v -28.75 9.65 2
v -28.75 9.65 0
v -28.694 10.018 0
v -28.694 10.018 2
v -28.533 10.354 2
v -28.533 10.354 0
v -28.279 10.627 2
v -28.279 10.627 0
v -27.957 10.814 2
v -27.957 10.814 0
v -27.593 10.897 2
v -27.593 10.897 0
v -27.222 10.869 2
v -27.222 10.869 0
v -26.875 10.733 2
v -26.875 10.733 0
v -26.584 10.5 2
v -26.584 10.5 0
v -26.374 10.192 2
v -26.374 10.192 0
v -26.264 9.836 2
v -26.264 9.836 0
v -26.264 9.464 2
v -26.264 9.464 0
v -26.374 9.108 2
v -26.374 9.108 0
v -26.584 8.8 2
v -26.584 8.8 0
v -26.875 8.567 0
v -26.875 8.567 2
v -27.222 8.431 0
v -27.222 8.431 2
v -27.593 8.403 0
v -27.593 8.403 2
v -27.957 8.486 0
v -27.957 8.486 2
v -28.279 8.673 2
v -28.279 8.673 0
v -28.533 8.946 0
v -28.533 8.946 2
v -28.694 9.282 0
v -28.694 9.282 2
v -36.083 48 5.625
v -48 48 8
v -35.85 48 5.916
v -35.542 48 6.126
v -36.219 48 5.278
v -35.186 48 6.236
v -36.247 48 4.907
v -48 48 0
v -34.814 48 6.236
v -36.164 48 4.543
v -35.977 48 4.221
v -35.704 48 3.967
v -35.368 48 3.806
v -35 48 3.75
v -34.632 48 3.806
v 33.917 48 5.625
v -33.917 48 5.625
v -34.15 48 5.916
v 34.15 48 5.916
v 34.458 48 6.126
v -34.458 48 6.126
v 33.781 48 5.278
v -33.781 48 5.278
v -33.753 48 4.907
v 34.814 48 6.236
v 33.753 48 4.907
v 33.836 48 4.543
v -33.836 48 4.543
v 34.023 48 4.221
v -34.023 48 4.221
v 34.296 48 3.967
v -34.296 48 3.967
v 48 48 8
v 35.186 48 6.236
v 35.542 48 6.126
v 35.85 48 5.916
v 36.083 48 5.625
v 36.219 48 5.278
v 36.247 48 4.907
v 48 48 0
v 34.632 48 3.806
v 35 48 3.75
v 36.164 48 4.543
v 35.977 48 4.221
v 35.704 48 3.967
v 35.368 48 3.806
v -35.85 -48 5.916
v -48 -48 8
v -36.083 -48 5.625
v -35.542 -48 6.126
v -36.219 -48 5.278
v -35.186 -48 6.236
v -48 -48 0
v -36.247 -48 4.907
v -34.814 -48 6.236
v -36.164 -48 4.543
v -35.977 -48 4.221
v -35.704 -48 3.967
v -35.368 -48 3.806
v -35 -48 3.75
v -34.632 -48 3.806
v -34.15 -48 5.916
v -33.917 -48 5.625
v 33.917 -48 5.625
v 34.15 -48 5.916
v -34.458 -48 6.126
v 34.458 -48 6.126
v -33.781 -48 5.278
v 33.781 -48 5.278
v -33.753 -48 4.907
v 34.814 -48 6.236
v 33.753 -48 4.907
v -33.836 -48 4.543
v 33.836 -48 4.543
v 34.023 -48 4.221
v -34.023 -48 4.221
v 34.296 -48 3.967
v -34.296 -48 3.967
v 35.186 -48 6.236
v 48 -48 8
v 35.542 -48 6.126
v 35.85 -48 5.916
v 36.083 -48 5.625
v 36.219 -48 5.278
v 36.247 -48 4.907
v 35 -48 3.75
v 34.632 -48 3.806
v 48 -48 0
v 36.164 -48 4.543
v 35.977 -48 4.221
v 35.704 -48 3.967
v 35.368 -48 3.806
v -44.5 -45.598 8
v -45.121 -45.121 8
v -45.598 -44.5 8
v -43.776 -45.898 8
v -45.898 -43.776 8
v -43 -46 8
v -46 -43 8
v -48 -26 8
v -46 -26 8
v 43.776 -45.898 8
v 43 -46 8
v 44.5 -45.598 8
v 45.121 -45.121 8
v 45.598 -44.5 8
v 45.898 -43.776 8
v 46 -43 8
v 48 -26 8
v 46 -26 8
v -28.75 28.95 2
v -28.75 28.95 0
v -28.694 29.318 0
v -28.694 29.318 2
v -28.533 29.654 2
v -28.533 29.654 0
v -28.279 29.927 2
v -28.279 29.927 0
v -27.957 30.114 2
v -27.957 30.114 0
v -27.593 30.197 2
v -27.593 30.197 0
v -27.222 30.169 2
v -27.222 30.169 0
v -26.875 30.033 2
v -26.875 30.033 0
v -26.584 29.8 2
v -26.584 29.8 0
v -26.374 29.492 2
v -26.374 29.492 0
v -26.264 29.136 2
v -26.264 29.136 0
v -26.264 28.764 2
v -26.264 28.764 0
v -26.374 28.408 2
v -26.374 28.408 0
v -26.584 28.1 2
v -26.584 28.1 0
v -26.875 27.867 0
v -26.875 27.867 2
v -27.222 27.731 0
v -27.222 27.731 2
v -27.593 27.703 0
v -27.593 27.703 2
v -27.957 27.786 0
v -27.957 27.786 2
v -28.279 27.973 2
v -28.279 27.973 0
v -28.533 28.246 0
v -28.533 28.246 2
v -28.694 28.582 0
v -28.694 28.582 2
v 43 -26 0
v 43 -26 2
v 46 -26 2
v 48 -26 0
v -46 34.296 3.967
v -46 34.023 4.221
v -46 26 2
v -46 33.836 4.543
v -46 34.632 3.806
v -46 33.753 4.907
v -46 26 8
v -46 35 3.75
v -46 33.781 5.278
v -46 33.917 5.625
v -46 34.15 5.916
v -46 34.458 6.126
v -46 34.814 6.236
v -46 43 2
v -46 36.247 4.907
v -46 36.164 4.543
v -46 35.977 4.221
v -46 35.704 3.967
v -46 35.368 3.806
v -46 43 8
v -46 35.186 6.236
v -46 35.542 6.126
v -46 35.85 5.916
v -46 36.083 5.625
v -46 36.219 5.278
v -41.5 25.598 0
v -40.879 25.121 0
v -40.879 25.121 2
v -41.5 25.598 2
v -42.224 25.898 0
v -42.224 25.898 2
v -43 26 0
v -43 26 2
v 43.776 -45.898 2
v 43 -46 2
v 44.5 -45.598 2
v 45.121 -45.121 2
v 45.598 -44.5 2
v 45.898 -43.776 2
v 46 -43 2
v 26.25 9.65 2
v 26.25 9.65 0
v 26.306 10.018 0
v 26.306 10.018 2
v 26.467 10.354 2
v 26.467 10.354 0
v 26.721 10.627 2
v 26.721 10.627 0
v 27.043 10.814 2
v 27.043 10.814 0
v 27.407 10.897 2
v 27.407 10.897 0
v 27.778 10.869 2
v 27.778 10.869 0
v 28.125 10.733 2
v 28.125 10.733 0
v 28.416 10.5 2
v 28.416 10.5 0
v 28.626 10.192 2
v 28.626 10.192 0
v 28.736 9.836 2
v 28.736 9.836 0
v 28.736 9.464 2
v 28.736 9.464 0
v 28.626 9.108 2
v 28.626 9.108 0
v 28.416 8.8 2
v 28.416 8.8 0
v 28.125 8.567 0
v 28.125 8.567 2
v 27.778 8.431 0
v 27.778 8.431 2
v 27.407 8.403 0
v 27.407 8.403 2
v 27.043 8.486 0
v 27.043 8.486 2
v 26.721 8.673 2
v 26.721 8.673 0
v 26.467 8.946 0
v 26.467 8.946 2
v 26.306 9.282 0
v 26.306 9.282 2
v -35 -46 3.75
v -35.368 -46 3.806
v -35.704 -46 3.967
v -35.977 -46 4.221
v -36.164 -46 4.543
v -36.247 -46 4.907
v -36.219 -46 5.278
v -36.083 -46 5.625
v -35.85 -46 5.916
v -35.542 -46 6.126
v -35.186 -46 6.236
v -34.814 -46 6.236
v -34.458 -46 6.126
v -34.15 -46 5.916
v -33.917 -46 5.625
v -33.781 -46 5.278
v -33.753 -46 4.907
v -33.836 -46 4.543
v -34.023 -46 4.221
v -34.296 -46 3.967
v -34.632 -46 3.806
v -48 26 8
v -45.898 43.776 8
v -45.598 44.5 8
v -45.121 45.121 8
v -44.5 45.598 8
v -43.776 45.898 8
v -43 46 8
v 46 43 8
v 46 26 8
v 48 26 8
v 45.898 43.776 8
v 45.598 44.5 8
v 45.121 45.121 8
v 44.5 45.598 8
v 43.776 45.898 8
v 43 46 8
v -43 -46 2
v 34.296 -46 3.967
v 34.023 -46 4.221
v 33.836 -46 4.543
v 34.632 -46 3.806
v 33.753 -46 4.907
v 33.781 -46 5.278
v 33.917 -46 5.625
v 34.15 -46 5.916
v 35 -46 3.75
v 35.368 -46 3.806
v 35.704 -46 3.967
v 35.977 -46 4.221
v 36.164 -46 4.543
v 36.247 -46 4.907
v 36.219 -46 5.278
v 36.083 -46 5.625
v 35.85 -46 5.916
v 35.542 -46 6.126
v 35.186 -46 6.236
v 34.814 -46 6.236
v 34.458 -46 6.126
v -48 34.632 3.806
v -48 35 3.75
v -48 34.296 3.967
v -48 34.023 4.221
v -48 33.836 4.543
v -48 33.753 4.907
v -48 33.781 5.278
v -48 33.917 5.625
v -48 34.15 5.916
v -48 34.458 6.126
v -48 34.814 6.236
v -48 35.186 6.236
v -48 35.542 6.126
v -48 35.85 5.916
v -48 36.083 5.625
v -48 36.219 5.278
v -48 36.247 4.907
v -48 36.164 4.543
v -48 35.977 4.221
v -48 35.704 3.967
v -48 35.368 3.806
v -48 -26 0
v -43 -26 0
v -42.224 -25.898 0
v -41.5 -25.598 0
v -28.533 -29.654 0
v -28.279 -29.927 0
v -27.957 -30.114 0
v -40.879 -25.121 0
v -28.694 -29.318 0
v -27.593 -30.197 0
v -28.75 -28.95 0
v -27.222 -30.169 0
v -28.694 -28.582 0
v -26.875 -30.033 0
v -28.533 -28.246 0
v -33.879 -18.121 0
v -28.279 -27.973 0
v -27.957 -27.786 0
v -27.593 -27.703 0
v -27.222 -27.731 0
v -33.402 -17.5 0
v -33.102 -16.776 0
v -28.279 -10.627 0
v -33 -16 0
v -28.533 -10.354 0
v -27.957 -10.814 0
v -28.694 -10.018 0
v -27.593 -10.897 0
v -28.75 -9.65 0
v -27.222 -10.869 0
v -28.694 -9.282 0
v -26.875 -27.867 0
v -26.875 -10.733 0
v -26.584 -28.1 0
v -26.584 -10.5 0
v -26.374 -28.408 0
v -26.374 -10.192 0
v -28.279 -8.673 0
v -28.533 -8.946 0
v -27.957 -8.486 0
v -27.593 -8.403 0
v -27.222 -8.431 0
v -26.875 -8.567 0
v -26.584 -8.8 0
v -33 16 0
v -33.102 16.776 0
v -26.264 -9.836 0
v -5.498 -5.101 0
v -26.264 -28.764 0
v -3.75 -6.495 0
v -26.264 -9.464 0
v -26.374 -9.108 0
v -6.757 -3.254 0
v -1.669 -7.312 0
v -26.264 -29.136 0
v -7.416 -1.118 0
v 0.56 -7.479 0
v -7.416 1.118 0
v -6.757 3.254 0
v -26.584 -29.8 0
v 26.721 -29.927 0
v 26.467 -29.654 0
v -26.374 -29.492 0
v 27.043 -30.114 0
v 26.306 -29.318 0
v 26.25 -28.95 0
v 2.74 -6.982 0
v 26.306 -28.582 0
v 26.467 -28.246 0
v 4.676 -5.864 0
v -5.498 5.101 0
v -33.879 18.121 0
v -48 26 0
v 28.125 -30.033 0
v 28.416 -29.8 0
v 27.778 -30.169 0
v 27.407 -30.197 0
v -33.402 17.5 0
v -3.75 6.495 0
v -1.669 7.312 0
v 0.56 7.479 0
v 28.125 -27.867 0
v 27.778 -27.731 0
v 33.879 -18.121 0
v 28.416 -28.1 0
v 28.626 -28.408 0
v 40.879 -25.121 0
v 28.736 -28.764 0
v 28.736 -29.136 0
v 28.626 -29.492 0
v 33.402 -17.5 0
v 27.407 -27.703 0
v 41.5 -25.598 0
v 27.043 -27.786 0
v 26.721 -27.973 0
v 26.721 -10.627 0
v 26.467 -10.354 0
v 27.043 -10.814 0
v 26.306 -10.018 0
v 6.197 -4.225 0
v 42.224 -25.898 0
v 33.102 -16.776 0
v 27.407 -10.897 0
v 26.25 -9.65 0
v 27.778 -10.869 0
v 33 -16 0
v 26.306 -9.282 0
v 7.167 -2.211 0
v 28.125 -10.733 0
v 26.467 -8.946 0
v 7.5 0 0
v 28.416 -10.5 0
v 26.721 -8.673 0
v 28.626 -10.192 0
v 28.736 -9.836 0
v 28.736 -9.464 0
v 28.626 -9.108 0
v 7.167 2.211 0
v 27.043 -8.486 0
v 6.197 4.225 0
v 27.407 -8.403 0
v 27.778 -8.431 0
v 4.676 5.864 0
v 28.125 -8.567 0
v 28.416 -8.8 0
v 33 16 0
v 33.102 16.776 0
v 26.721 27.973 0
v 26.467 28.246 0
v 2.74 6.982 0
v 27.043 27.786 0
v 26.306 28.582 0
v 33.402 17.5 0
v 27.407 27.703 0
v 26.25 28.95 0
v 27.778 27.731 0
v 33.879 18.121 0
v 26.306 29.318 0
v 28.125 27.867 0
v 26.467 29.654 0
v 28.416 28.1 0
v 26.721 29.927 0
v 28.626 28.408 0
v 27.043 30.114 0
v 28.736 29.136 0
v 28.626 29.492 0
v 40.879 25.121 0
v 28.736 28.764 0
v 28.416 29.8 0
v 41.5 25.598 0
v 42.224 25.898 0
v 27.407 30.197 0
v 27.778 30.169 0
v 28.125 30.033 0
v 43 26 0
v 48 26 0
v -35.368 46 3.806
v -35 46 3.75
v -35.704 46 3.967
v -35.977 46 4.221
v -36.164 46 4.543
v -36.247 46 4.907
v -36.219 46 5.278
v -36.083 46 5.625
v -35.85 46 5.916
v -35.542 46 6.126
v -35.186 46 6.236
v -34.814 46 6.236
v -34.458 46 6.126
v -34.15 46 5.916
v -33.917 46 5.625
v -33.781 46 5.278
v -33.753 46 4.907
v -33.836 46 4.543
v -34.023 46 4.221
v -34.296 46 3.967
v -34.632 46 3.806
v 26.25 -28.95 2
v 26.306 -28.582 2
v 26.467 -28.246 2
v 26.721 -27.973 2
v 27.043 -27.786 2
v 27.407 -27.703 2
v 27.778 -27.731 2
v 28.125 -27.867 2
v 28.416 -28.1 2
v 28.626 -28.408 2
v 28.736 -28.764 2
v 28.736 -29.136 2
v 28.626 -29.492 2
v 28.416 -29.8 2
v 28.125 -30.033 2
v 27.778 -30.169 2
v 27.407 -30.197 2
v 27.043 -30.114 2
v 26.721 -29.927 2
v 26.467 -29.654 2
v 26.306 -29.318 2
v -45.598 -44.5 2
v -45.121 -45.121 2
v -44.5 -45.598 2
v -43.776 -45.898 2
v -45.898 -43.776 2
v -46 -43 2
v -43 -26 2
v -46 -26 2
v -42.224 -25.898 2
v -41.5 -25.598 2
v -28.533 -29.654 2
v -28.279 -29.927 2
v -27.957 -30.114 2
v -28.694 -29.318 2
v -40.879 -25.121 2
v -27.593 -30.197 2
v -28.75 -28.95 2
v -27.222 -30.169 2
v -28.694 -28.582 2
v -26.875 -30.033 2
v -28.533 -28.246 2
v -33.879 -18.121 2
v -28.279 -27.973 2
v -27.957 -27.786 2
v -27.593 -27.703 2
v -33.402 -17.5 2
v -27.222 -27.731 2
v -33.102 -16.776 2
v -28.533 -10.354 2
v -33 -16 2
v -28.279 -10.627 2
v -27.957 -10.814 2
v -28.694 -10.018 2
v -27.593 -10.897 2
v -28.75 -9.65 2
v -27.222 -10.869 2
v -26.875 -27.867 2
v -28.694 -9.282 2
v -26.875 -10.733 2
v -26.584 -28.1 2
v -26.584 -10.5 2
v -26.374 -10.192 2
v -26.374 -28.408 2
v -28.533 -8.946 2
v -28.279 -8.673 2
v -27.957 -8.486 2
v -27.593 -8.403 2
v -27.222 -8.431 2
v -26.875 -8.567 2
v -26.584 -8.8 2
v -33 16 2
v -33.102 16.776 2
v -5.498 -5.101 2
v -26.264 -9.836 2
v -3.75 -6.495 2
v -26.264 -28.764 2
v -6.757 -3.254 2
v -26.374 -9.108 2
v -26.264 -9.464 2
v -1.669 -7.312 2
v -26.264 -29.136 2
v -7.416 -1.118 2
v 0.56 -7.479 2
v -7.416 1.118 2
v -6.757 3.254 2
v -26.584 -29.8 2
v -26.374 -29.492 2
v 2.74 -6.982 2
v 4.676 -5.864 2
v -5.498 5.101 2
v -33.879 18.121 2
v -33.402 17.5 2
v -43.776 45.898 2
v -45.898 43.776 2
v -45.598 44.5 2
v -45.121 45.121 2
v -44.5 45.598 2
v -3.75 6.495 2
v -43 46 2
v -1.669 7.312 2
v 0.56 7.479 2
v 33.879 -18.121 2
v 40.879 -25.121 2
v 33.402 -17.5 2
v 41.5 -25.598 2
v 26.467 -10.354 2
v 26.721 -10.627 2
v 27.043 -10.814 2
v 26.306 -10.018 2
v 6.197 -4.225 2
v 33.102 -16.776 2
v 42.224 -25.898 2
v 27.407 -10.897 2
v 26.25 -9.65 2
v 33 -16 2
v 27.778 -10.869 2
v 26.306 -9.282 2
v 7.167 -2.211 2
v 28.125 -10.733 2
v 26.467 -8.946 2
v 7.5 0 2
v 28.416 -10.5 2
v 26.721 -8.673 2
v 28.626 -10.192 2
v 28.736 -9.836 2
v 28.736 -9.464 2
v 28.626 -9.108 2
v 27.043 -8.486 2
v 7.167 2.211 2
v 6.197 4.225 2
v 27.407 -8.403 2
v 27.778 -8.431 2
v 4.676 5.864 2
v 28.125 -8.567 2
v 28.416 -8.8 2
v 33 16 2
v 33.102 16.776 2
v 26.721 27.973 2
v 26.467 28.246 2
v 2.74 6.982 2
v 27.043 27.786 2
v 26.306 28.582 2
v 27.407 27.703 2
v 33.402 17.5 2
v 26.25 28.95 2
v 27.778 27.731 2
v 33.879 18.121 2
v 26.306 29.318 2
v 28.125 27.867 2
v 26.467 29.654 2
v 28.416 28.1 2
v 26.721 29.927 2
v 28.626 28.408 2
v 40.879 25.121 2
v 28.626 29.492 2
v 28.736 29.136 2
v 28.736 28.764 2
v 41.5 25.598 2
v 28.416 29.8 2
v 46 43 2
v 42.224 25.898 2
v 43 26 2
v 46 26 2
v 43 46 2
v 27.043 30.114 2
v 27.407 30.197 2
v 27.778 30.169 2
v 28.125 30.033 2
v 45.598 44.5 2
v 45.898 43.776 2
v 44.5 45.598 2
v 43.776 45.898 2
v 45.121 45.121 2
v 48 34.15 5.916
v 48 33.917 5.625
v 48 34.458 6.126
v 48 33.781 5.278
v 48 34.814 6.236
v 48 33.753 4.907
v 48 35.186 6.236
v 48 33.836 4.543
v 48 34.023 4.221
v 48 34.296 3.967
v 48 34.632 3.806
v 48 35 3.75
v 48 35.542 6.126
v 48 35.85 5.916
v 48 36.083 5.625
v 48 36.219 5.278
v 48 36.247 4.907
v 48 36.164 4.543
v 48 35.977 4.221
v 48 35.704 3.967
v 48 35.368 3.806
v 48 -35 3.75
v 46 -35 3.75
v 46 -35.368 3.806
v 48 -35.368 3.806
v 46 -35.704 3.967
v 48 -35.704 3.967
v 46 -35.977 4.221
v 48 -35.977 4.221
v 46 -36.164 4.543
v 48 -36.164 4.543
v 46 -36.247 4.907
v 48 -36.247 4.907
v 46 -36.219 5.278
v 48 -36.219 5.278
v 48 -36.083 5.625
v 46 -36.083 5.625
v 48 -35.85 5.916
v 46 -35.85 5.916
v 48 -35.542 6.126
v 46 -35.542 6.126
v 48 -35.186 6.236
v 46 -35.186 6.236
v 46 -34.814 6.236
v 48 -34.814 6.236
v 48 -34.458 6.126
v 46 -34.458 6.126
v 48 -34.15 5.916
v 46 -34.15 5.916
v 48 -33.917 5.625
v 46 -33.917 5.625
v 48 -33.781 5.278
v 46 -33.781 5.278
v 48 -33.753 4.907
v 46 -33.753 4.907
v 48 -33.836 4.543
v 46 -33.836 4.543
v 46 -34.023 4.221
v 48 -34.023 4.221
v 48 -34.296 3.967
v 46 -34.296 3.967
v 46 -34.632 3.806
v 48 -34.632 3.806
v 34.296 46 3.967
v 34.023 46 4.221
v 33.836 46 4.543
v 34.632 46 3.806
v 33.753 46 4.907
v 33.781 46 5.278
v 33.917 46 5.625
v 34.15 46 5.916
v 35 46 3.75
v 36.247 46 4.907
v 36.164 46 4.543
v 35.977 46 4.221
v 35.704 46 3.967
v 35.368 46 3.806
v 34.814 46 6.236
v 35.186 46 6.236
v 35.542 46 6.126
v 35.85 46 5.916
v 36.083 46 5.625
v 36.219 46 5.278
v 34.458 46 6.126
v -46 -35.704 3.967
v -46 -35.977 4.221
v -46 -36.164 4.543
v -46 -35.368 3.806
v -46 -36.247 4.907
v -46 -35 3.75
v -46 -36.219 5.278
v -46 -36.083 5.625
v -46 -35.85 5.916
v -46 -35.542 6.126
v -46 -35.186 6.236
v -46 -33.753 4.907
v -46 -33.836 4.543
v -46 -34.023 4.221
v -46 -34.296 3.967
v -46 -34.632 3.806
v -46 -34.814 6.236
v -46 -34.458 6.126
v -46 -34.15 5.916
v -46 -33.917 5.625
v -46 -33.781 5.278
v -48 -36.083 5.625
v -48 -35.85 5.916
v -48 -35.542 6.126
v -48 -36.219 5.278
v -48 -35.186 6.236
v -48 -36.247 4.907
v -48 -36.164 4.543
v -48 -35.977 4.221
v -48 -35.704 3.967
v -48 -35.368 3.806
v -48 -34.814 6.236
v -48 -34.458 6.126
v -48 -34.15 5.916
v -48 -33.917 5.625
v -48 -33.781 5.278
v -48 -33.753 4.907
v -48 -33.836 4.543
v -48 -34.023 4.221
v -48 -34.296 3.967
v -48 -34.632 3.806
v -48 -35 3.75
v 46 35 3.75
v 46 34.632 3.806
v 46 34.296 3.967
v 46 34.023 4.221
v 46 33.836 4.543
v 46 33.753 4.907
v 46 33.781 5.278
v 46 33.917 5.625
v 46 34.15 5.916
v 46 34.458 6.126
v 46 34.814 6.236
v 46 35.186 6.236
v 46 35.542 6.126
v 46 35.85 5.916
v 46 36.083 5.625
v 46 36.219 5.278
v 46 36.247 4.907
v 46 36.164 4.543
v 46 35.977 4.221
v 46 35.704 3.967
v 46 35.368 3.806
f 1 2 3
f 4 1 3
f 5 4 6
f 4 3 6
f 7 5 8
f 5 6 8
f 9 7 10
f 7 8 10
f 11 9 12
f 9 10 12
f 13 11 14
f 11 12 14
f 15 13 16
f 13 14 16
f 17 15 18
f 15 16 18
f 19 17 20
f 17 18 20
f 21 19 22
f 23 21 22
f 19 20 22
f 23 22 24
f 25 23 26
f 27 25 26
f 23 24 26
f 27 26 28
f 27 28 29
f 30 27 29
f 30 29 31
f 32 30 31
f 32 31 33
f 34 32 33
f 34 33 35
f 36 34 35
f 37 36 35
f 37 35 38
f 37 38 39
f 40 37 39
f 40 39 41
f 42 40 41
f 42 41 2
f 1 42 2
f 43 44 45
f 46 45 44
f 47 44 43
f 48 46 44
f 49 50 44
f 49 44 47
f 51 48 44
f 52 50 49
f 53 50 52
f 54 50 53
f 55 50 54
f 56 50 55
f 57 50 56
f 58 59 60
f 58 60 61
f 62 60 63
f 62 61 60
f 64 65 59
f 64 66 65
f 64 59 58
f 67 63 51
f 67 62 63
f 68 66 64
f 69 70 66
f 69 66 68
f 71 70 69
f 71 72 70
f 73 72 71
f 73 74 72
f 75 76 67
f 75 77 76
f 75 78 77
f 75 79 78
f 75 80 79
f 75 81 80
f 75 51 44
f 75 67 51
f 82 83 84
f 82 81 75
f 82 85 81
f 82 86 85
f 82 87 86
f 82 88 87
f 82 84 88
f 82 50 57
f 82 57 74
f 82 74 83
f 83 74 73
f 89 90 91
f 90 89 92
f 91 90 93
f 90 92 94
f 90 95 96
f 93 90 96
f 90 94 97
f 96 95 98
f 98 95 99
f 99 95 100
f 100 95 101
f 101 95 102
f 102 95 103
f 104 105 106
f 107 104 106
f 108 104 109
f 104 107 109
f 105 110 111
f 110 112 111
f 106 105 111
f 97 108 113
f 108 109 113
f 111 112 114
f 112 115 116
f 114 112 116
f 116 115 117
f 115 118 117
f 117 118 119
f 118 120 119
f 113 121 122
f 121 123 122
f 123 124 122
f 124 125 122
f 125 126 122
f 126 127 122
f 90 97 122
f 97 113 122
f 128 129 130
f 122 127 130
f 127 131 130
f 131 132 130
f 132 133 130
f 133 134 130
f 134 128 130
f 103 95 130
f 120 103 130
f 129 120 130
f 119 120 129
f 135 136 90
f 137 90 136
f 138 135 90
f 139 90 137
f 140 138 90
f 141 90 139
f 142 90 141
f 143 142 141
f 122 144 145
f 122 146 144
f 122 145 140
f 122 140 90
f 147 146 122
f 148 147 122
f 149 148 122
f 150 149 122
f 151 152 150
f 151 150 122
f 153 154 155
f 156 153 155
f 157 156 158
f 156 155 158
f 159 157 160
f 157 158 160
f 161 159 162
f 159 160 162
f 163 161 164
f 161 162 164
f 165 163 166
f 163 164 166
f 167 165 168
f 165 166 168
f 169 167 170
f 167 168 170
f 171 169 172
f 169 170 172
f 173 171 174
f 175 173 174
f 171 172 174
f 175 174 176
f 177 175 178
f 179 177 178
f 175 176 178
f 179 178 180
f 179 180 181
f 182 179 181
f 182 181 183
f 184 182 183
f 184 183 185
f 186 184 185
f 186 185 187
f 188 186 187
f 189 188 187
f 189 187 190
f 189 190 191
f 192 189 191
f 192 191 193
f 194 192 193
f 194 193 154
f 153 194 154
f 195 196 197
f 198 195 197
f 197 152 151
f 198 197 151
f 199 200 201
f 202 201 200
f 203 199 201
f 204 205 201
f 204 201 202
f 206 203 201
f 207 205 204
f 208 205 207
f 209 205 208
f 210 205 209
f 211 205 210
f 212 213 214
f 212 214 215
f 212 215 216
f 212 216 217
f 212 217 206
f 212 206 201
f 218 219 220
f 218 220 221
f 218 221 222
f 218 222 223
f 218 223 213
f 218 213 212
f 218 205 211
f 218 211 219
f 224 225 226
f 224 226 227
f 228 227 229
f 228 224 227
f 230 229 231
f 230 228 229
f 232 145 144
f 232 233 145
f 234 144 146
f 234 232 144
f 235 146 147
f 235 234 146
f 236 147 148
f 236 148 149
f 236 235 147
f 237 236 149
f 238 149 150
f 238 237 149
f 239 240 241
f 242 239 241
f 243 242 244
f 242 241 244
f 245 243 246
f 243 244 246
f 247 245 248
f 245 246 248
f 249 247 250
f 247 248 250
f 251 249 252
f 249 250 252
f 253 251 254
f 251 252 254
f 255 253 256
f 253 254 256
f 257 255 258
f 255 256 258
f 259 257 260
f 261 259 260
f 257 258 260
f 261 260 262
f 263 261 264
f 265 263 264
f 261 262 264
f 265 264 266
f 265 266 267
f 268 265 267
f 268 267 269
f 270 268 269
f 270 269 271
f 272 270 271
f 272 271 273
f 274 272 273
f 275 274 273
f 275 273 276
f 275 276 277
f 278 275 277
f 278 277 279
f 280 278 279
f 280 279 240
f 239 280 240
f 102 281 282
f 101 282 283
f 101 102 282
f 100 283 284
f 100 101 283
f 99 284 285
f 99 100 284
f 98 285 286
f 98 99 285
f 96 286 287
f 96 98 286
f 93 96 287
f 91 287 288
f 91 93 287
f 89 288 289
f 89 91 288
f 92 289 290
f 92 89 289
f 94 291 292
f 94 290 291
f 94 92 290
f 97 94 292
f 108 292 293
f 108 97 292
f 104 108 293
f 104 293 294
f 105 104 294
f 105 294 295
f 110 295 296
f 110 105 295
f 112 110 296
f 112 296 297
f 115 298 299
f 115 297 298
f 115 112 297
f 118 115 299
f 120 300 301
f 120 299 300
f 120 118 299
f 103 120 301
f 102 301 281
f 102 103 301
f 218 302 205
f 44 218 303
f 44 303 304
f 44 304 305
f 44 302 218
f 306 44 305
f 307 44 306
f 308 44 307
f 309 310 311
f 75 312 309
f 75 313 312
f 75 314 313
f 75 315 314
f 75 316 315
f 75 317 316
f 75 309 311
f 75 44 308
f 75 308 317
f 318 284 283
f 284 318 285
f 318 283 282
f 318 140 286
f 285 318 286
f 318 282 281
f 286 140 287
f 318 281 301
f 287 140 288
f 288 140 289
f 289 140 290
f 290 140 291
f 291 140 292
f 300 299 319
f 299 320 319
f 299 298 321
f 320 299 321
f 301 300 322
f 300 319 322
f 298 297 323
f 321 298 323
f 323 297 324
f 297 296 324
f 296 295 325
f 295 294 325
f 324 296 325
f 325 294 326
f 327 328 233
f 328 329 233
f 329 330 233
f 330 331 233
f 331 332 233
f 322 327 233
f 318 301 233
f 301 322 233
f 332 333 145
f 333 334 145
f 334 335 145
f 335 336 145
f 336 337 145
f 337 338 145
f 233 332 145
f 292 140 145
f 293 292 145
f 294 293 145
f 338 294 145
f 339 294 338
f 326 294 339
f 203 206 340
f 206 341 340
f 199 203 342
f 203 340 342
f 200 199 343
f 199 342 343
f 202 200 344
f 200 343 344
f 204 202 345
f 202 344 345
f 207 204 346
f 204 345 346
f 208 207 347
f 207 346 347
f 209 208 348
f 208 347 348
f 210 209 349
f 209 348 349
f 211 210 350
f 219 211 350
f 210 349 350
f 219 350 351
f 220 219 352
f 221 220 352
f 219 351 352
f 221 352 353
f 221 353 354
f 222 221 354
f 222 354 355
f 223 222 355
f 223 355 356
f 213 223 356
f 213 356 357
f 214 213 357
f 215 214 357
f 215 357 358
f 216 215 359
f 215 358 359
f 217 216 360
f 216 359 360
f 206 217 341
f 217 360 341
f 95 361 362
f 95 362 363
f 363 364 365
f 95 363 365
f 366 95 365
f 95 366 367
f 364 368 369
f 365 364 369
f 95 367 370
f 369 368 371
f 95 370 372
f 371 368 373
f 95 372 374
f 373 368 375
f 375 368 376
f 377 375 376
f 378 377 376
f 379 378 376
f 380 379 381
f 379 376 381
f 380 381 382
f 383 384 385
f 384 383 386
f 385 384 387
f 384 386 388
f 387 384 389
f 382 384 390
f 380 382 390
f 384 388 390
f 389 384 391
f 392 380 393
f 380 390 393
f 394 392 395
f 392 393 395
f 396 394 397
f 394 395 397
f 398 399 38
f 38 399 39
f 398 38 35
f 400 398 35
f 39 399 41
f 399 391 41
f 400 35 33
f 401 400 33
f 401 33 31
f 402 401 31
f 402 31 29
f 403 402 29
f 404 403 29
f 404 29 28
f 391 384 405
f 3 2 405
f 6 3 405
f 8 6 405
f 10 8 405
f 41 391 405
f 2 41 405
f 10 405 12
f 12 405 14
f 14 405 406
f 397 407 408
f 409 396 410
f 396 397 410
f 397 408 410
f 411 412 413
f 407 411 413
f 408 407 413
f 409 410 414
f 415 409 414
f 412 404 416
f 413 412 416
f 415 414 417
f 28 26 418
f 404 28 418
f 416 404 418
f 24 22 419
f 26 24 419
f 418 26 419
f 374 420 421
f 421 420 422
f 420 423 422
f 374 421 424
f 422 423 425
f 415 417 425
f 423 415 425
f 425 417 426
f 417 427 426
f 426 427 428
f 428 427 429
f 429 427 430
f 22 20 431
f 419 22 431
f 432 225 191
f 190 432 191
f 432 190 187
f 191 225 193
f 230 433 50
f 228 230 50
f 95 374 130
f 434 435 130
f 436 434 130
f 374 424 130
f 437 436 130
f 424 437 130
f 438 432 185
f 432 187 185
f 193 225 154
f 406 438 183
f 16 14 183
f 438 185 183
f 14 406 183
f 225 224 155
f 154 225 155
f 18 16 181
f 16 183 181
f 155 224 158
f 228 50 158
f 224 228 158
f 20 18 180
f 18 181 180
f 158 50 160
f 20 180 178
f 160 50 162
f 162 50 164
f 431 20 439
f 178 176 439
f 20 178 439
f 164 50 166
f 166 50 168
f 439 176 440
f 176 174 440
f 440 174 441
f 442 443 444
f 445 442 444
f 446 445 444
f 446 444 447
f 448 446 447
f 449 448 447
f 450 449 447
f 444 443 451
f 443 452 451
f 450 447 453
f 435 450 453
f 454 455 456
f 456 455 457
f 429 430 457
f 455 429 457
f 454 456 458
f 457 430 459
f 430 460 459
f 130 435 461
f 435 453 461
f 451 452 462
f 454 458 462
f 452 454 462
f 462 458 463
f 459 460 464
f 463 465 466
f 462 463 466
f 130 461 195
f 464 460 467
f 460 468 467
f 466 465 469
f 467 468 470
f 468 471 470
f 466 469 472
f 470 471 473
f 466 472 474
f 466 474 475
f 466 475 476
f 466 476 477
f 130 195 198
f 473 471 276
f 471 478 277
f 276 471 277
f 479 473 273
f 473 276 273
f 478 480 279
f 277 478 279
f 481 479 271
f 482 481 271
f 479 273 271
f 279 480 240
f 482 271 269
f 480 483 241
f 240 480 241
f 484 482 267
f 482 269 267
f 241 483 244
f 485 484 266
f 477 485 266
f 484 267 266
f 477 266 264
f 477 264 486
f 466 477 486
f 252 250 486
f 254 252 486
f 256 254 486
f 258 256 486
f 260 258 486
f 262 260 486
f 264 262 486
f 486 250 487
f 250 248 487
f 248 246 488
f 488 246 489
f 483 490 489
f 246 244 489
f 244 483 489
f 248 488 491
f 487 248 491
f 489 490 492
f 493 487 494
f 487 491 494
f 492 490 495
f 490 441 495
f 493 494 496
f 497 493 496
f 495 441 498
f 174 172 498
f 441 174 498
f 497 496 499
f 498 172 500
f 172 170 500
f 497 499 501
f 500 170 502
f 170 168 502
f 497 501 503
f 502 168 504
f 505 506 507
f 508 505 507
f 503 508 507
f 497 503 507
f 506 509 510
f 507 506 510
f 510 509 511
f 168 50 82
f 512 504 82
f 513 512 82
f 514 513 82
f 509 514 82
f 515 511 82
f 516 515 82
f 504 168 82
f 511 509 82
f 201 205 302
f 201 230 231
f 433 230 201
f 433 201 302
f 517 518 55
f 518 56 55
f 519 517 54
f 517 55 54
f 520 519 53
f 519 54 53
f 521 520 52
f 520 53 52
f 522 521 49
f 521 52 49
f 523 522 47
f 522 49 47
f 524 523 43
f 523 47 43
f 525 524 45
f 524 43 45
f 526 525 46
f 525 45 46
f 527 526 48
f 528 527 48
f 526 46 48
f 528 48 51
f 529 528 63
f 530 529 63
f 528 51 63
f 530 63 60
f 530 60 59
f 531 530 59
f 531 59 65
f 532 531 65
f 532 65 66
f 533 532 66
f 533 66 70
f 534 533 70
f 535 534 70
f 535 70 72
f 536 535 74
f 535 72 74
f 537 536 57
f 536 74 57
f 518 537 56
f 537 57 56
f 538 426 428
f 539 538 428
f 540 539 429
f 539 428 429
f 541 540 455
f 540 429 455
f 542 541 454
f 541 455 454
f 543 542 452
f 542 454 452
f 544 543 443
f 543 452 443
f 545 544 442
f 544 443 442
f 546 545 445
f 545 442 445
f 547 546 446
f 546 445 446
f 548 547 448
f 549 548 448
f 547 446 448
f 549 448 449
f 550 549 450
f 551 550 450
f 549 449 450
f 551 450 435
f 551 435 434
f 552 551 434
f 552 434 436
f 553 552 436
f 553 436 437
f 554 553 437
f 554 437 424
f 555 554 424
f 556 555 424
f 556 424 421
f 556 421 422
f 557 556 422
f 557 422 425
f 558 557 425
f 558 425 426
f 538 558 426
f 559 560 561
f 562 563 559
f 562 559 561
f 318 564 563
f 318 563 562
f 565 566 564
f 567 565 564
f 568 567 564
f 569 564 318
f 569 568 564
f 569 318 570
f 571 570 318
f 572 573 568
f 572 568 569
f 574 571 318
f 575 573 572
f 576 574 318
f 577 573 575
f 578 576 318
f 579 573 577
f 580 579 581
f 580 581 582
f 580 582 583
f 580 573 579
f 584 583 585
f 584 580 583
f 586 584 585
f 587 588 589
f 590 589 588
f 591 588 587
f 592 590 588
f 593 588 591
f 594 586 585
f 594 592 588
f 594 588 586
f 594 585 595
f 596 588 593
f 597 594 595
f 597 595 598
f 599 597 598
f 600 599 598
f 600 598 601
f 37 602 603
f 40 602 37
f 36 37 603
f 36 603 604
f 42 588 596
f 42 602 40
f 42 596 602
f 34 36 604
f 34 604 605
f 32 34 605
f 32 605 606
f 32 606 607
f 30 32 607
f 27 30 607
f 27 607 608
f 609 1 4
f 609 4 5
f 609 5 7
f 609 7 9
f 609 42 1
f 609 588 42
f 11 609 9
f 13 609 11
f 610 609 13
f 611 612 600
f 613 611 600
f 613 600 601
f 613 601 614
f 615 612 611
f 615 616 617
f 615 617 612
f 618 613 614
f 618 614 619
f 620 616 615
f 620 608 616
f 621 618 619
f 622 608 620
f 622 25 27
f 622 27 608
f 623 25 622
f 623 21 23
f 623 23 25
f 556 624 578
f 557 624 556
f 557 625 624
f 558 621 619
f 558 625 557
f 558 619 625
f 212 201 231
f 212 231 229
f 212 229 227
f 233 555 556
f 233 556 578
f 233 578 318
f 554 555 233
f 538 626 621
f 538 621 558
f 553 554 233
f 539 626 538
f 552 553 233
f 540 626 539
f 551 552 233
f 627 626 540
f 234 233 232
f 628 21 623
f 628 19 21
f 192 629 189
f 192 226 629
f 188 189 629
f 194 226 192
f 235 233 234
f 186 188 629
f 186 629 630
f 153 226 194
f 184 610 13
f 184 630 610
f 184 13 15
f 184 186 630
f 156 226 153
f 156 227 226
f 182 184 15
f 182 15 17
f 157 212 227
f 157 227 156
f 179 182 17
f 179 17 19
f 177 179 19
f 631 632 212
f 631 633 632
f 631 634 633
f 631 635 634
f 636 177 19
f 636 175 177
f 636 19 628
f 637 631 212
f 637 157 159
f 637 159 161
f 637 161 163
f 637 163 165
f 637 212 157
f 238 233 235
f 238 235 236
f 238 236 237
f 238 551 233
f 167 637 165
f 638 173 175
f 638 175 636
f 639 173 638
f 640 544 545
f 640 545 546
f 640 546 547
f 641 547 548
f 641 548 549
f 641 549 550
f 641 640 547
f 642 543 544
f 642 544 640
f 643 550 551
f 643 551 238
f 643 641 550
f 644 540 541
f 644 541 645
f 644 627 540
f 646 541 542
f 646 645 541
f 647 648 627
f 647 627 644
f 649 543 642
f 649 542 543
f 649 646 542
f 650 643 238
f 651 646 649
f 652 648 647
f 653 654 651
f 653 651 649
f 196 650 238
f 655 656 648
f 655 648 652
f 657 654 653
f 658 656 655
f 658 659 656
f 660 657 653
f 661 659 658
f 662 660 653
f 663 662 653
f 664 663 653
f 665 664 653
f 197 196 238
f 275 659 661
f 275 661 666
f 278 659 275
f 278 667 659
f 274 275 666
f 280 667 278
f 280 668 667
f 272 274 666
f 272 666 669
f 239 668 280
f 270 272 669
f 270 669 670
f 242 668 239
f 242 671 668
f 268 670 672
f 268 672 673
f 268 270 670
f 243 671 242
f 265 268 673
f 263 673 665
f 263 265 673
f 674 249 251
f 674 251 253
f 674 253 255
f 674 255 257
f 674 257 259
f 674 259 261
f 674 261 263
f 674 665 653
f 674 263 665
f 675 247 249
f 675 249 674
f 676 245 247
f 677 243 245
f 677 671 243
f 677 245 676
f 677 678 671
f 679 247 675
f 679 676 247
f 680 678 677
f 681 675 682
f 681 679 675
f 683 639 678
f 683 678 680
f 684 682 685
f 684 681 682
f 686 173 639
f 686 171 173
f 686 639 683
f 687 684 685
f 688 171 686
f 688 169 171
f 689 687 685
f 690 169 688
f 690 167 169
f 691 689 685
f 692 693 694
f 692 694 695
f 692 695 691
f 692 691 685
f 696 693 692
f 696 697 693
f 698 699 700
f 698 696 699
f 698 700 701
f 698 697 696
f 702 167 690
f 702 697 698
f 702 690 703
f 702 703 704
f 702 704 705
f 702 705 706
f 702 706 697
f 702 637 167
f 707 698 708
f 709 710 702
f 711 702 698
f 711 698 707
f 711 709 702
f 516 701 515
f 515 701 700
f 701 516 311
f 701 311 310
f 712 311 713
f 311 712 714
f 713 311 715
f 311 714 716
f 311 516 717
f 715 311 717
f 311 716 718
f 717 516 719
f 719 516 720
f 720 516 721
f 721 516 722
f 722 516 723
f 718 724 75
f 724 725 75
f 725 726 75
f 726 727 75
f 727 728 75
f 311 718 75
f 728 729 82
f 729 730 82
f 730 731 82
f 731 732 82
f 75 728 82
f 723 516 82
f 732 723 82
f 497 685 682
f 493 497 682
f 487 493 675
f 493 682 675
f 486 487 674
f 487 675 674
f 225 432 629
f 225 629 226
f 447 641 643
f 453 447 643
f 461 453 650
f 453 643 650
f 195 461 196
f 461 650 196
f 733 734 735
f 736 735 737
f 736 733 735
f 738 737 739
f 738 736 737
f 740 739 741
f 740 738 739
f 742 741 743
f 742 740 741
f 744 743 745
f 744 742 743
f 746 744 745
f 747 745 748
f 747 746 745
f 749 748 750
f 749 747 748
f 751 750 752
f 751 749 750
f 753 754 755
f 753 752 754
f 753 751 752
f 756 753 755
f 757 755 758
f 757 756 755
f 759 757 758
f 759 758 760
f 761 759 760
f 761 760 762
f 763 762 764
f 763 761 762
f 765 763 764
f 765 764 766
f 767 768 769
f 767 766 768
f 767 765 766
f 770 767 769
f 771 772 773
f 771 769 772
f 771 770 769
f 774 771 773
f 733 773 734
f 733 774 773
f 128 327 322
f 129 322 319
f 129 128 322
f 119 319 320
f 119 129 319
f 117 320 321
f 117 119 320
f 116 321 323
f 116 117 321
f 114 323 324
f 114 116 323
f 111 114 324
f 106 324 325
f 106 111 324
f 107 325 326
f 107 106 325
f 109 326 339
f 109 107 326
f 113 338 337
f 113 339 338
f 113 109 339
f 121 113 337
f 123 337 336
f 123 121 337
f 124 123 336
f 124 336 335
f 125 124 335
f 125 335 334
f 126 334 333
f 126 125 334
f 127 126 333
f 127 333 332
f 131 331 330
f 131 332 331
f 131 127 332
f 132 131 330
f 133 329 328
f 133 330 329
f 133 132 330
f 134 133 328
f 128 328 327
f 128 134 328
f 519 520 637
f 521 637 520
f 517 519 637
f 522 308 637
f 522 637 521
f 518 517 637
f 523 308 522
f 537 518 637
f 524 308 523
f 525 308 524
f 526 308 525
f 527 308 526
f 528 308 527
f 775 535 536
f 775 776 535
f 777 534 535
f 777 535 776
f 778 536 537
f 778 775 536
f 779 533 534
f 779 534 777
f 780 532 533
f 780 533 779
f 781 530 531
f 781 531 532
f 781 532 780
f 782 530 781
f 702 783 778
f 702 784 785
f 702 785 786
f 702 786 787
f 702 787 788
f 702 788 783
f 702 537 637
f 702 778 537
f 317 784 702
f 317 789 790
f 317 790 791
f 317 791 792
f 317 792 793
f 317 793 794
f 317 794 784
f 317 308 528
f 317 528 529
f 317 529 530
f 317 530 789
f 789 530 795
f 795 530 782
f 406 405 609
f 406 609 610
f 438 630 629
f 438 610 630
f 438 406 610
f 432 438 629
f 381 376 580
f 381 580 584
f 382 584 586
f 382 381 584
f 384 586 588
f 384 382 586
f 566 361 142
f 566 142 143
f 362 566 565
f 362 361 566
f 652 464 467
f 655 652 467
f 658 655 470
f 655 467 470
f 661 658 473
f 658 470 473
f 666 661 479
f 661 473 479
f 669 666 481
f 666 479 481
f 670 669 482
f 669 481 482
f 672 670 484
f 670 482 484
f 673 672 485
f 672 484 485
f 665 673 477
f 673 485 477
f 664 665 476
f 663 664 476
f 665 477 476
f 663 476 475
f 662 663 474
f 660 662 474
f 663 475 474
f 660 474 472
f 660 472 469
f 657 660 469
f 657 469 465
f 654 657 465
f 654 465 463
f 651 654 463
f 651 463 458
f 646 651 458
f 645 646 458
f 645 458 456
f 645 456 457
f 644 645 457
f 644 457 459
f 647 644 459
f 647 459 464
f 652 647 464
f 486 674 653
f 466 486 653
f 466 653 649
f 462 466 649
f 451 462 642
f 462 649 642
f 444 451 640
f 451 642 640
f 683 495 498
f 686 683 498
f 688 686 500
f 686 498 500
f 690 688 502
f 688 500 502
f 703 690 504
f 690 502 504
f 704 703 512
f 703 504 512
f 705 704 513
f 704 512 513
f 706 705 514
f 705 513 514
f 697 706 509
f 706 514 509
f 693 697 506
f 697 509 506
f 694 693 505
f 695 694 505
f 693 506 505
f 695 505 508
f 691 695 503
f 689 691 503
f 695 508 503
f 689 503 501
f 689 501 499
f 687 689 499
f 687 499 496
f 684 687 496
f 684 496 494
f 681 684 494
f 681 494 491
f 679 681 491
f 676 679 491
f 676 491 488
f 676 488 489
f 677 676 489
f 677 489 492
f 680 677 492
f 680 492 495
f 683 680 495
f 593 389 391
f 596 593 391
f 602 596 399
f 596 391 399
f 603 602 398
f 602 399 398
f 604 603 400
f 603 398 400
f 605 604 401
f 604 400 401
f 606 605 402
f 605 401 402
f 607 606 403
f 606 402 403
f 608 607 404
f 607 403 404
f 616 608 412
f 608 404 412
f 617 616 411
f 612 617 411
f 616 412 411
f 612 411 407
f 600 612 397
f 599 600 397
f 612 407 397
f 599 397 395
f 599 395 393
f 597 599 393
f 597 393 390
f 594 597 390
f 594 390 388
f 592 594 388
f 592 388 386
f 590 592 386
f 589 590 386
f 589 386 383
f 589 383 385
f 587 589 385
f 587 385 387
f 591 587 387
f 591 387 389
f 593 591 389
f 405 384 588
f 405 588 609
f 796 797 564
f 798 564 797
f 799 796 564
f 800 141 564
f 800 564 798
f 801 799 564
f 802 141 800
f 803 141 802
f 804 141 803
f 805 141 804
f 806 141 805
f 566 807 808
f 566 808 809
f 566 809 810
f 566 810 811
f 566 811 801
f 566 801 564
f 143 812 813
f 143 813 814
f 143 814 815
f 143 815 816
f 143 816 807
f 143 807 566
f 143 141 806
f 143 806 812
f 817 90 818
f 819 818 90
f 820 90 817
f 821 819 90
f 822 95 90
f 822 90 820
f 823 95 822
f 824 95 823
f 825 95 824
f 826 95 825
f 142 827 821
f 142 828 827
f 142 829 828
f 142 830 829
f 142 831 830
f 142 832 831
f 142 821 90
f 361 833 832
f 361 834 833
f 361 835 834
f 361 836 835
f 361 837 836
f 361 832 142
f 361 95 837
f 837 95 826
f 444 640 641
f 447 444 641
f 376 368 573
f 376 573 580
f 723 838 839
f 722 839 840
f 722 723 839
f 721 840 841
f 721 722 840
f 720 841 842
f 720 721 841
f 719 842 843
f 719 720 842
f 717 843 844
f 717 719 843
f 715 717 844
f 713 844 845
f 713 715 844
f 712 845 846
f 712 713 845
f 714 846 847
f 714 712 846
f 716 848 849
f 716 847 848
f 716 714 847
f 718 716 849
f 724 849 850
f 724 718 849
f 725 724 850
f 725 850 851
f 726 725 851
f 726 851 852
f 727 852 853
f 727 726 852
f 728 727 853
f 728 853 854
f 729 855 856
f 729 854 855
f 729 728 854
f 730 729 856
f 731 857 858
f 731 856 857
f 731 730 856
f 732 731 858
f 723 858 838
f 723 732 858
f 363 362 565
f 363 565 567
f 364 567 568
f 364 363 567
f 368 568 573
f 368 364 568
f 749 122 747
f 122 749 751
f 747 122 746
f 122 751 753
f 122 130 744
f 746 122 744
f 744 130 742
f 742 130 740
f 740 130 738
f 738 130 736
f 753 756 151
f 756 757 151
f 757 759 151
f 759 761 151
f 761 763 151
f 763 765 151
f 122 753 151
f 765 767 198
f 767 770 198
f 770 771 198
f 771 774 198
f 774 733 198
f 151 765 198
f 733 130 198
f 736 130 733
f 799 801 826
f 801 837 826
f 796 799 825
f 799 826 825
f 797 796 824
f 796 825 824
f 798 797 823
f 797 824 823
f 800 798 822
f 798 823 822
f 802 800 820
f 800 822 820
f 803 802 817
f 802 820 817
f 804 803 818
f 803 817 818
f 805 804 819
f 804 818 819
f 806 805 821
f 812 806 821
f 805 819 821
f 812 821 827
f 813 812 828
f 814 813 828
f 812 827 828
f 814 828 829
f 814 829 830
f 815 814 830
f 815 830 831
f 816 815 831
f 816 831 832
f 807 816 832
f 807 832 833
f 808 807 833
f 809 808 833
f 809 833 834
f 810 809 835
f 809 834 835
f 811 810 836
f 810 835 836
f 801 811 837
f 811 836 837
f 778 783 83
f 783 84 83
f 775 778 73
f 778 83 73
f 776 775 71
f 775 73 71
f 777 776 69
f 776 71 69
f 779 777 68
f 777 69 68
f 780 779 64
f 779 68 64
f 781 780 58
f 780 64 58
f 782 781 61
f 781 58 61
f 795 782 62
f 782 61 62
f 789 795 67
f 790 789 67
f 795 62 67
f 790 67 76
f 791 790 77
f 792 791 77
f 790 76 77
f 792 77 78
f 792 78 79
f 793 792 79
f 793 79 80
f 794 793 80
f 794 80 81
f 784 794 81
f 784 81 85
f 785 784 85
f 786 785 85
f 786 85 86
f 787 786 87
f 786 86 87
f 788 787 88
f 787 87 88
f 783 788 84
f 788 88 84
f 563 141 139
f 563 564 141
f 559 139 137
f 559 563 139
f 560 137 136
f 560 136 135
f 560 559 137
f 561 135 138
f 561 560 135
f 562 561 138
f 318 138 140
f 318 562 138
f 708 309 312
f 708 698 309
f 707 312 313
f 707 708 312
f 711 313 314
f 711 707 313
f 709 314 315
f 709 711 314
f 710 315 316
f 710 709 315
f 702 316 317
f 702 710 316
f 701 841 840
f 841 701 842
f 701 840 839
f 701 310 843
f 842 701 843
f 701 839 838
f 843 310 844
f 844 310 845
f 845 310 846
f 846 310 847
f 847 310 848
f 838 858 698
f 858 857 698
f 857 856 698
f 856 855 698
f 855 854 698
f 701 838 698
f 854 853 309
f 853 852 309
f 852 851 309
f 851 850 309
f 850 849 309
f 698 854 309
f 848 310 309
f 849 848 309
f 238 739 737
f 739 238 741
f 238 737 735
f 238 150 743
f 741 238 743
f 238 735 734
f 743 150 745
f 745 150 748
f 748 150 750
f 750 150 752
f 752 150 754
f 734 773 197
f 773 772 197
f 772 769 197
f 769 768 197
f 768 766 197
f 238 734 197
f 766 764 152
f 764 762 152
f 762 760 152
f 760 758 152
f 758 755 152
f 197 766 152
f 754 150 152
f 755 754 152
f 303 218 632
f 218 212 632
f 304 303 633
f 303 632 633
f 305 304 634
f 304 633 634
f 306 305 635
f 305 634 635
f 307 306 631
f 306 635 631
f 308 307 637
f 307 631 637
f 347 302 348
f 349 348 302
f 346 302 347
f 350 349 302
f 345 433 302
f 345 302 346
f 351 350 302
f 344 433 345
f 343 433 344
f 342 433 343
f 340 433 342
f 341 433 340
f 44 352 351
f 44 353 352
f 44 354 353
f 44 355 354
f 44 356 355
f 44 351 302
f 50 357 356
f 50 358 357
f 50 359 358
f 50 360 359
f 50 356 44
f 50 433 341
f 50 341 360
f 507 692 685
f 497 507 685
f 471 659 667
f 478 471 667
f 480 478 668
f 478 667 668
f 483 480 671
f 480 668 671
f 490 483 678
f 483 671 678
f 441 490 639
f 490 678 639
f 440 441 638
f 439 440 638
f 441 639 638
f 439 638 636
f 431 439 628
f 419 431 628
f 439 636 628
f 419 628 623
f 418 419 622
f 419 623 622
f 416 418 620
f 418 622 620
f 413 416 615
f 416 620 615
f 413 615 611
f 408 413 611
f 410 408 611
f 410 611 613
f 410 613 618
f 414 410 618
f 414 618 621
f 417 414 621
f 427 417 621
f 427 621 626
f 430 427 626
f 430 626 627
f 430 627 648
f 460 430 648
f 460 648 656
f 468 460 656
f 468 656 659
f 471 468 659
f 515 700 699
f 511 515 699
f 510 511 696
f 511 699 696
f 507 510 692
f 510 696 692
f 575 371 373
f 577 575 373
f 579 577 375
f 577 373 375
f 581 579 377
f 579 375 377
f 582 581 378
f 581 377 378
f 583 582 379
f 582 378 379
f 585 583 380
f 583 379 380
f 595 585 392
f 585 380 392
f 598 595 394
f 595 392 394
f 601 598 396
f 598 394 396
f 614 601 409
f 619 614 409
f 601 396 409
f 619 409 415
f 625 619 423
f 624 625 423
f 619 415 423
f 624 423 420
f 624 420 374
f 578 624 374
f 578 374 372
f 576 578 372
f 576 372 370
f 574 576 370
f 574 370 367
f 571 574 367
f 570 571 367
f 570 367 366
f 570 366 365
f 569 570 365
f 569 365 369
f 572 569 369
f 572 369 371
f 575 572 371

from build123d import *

# Parameters (mm, degrees)
SKETCH1_W                      = 96
SKETCH1_H                      = 96
BOSS_EXTRUDE1_DEPTH            = 8
SKETCH2_W                      = 92
SKETCH2_H                      = 92
COMPONENT_PLATFORM_DEPTH       = 6
CABLE_SLOTS_DEPTH              = 6
SKETCH4_R                      = 7.5
CENTER_MASS_CUT_DEPTH          = 6
INNER_CORNER_FILLETS_R         = 3
M3X0_5_TAPPED_HOLE1_AT_2_COUNT = 2
M3X0_5_TAPPED_HOLE1_AT_2_PITCH = 70
M3X0_5_TAPPED_HOLE2_AT_2_COUNT = 2
M3X0_5_TAPPED_HOLE2_AT_2_PITCH = 70
M3X0_5_TAPPED_HOLE3_D          = 2.5


with BuildPart() as part:
    # Sketch1 → Boss-Extrude1 (new body)
    with BuildSketch(Plane.XY):
        Rectangle(SKETCH1_W, SKETCH1_H)
    extrude(amount=BOSS_EXTRUDE1_DEPTH)

    # Sketch2 → Component Platform (cut)
    with BuildSketch(Plane.XY.offset(8)):
        Rectangle(SKETCH2_W, SKETCH2_H)
    extrude(amount=-COMPONENT_PLATFORM_DEPTH, mode=Mode.SUBTRACT)

    # Sketch3 → Cable Slots (cut, symmetric)
    with BuildSketch(Plane.XY.offset(2)):
        with BuildLine():
            Line((-40.878679656, -25.121320344), (-33.878679656, -18.121320344))
            ThreePointArc((-33.878679656, -18.121320344), (-33.228361402, -17.148050297), (-33, -16))
            Line((-33, -16), (-33, 16))
            ThreePointArc((-33, 16), (-33.228361402, 17.148050297), (-33.878679656, 18.121320344))
            Line((-33.878679656, 18.121320344), (-40.878679656, 25.121320344))
            ThreePointArc((-40.878679656, 25.121320344), (-41.851949703, 25.771638598), (-43, 26))
            Line((-43, 26), (-48, 26))
            Line((-48, 26), (-48, -26))
            Line((-48, -26), (-43, -26))
            ThreePointArc((-43, -26), (-41.851949703, -25.771638598), (-40.878679656, -25.121320344))
        make_face()
        with BuildLine():
            Line((48, -26), (48, 26))
            Line((48, 26), (43, 26))
            ThreePointArc((43, 26), (41.851949703, 25.771638598), (40.878679656, 25.121320344))
            Line((40.878679656, 25.121320344), (33.878679656, 18.121320344))
            ThreePointArc((33.878679656, 18.121320344), (33.228361402, 17.148050297), (33, 16))
            Line((33, 16), (33, -16))
            ThreePointArc((33, -16), (33.228361402, -17.148050297), (33.878679656, -18.121320344))
            Line((33.878679656, -18.121320344), (40.878679656, -25.121320344))
            ThreePointArc((40.878679656, -25.121320344), (41.851949703, -25.771638598), (43, -26))
            Line((43, -26), (48, -26))
        make_face()
    extrude(amount=CABLE_SLOTS_DEPTH, both=True, mode=Mode.SUBTRACT)

    # Sketch4 → Center Mass Cut (cut)
    with BuildSketch(Plane.XY.offset(2)):
        Circle(SKETCH4_R)
    extrude(amount=-CENTER_MASS_CUT_DEPTH, mode=Mode.SUBTRACT)

    # Inner Corner Fillets
    inner_corner_fillets_edges = [part.edges().sort_by_distance(p)[0] for p in [
        (-46, -46, 5),
        (-46, 46, 5),
        (46, 46, 5),
        (46, -46, 5),
    ]]
    fillet(inner_corner_fillets_edges, radius=INNER_CORNER_FILLETS_R)

    # Sketch10 → M3x0.5 Tapped Hole1 (revolve, cut)
    with BuildSketch(Plane(origin=(48, -35, 5), x_dir=(0, 0, -1), z_dir=(0, 1, 0))):
        Polygon((0, 0), (0, 10.751075774), (1.25, 10), (1.25, 0), align=None)
    m3x0_5_tapped_hole1 = revolve(axis=Axis((54.35, -35, 5), (-1, 0, 0)), mode=Mode.SUBTRACT)

    # M3x0.5 Tapped Hole1 at 2: M3x0.5 Tapped Hole1 ×2
    with Locations(*[(0, i * M3X0_5_TAPPED_HOLE1_AT_2_PITCH, 0) for i in range(1, M3X0_5_TAPPED_HOLE1_AT_2_COUNT)]):
        add(m3x0_5_tapped_hole1, mode=Mode.SUBTRACT)

    # Sketch13 → M3x0.5 Tapped Hole2 (revolve, cut)
    with BuildSketch(Plane(origin=(-35, -48, 5), x_dir=(0, 0, -1), z_dir=(1, 0, 0))):
        Polygon((0, 0), (0, 10.751075774), (1.25, 10), (1.25, 0), align=None)
    m3x0_5_tapped_hole2 = revolve(axis=Axis((-35, -54.35, 5), (0, 1, 0)), mode=Mode.SUBTRACT)

    # M3x0.5 Tapped Hole2 at 2: M3x0.5 Tapped Hole2 ×2
    with Locations(*[(i * M3X0_5_TAPPED_HOLE2_AT_2_PITCH, 0, 0) for i in range(1, M3X0_5_TAPPED_HOLE2_AT_2_COUNT)]):
        add(m3x0_5_tapped_hole2, mode=Mode.SUBTRACT)

    # Mirror1: M3x0.5 Tapped Hole1 across plane
    add(m3x0_5_tapped_hole1.mirror(Plane(origin=(0, 0, 0), x_dir=(0, 0, 1), z_dir=(1, 0, 0))), mode=Mode.SUBTRACT)

    # Mirror1 copy 1 sketch → Mirror1 copy 1 (revolve, cut)
    with BuildSketch(Plane(origin=(-48, 35, 5), x_dir=(0, 0, -1), z_dir=(0, 1, 0))):
        Polygon((0, 0), (0, -10.751075774), (1.25, -10), (1.25, 0), align=None)
    revolve(axis=Axis((-54.35, 35, 5), (-1, 0, 0)), mode=Mode.SUBTRACT)

    # Mirror2: M3x0.5 Tapped Hole2 across plane
    add(m3x0_5_tapped_hole2.mirror(Plane(origin=(0, 0, 0), x_dir=(0, 0, 1), z_dir=(0, -1, 0))), mode=Mode.SUBTRACT)

    # Mirror2 copy 1 sketch → Mirror2 copy 1 (revolve, cut)
    with BuildSketch(Plane(origin=(35, 48, 5), x_dir=(0, 0, -1), z_dir=(1, 0, 0))):
        Polygon((0, 0), (0, -10.751075774), (1.25, -10), (1.25, 0), align=None)
    revolve(axis=Axis((35, 54.35, 5), (0, 1, 0)), mode=Mode.SUBTRACT)

    # M3x0.5 Tapped Hole3 (through all)
    with Locations(Plane.XY.offset(2)):
        with Locations((-27.5, 28.95), (-27.5, 9.65), (-27.5, -9.65), (-27.5, -28.95), (27.5, -28.95), (27.5, -9.65), (27.5, 9.65), (27.5, 28.95)):
            Hole(M3X0_5_TAPPED_HOLE3_D / 2)


solid = part.part
